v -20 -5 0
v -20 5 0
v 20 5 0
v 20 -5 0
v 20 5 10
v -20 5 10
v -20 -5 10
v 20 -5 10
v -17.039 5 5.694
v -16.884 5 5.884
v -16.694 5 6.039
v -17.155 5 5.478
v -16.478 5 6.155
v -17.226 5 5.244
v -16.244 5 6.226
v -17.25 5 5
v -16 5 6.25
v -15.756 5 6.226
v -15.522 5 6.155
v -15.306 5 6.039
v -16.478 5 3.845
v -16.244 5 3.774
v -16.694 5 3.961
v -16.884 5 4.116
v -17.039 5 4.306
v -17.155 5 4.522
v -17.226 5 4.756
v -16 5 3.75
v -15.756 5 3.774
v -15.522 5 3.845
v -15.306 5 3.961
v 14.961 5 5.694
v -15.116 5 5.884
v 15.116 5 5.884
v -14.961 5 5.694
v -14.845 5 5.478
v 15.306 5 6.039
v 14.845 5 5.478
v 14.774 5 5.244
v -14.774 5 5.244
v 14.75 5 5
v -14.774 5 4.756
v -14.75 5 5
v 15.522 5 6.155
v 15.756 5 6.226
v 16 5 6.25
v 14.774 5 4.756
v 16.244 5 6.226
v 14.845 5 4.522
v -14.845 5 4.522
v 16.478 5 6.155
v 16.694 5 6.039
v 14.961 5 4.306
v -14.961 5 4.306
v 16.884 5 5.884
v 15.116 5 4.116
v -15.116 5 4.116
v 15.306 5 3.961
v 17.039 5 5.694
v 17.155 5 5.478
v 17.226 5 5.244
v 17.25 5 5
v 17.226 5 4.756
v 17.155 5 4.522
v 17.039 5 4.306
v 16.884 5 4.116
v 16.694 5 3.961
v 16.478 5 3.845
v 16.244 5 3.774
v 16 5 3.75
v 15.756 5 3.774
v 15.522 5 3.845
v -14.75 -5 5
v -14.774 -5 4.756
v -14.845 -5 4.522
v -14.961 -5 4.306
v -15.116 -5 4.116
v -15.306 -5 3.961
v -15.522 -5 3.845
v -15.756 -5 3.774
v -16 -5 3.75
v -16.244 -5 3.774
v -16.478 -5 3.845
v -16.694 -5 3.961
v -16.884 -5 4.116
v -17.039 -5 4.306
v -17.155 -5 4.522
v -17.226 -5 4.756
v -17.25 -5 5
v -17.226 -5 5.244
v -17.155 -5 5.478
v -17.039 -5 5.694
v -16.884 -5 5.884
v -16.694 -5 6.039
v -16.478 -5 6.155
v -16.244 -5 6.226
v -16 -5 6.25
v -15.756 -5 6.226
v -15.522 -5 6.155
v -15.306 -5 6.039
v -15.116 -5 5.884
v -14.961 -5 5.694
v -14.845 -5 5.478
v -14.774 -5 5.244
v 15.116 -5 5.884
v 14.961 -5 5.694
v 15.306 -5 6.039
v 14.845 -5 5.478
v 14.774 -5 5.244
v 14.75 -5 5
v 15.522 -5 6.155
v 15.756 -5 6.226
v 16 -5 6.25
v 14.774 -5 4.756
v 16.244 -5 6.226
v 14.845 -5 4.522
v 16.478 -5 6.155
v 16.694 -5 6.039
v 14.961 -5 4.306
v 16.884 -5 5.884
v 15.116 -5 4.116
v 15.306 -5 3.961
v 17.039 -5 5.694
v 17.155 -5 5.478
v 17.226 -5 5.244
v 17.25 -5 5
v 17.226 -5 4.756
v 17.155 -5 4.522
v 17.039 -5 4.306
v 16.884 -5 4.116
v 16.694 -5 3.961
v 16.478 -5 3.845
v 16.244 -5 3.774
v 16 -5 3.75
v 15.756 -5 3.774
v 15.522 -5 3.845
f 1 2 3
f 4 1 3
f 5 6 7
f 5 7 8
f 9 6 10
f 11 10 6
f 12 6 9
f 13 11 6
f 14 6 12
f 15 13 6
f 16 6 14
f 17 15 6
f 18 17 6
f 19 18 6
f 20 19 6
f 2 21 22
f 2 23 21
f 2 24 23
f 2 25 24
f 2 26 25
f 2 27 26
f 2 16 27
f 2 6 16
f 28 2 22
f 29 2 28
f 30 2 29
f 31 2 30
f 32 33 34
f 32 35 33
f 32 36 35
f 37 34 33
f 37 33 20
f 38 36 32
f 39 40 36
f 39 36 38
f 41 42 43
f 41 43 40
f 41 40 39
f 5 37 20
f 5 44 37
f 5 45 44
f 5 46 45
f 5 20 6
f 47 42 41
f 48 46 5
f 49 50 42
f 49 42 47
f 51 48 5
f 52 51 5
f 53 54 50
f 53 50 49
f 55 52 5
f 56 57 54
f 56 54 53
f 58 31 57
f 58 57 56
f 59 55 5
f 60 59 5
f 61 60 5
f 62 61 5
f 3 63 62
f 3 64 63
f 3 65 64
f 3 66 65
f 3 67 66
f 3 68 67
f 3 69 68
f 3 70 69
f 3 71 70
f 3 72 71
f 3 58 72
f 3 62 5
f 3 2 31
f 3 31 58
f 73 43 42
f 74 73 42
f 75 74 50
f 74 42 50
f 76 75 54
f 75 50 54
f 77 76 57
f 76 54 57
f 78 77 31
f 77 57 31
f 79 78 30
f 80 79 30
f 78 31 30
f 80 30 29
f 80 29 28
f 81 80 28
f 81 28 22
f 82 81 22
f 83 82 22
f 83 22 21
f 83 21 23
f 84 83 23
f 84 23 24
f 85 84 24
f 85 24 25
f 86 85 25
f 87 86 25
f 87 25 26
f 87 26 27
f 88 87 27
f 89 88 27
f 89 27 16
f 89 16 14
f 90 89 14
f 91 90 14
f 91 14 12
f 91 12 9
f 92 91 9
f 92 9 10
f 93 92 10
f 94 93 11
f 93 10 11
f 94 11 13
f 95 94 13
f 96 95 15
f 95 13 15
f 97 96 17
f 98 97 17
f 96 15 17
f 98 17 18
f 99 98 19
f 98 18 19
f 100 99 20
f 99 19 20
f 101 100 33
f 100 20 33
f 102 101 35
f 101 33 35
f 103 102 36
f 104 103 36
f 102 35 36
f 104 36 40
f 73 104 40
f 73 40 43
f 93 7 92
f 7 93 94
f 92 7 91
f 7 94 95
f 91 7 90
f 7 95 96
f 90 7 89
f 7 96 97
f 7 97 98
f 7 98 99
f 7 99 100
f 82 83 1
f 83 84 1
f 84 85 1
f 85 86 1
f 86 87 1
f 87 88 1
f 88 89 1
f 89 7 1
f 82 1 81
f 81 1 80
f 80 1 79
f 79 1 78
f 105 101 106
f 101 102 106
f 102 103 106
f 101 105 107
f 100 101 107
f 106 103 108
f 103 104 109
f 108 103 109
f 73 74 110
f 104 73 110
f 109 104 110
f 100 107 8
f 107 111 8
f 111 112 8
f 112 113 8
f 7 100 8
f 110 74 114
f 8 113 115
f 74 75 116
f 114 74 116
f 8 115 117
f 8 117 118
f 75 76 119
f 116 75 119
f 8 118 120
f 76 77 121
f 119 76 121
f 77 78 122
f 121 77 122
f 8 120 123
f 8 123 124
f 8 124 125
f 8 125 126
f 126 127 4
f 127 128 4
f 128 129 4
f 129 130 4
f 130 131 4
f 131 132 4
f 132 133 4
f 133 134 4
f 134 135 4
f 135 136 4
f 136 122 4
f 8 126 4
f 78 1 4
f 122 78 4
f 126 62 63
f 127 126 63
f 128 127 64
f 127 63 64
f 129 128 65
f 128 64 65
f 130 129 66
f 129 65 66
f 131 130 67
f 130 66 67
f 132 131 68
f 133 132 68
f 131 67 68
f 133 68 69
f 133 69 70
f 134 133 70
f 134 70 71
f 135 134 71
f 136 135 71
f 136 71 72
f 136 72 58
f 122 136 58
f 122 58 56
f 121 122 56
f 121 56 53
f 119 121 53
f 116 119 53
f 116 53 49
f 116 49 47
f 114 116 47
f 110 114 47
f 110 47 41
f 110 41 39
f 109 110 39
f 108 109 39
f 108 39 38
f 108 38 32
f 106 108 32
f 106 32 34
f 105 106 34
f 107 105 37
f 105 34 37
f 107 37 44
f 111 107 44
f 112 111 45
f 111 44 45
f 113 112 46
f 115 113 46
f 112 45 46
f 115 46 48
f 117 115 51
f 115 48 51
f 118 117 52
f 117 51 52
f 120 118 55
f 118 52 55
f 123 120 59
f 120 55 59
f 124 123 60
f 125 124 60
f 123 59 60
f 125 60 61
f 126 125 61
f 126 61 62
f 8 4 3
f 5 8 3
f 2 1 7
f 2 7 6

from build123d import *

# Parameters (mm, degrees)
SKETCH1_W                   = 40
SKETCH1_H                   = 10
BOSS_EXTRUDE1_DEPTH         = 10
TAP_DRILL_FOR_M3X0_5_TAP1_D = 2.5


with BuildPart() as part:
    # Sketch1 → Boss-Extrude1 (new body)
    with BuildSketch(Plane.XY):
        Rectangle(SKETCH1_W, SKETCH1_H)
    extrude(amount=BOSS_EXTRUDE1_DEPTH)

    # Tap Drill for M3x0.5 Tap1 (through all)
    with Locations(Plane(origin=(0, -5, 0), x_dir=(-1, 0, 0), z_dir=(0, -1, 0))):
        with Locations((16, -5), (-16, -5)):
            Hole(TAP_DRILL_FOR_M3X0_5_TAP1_D / 2)


solid = part.part
